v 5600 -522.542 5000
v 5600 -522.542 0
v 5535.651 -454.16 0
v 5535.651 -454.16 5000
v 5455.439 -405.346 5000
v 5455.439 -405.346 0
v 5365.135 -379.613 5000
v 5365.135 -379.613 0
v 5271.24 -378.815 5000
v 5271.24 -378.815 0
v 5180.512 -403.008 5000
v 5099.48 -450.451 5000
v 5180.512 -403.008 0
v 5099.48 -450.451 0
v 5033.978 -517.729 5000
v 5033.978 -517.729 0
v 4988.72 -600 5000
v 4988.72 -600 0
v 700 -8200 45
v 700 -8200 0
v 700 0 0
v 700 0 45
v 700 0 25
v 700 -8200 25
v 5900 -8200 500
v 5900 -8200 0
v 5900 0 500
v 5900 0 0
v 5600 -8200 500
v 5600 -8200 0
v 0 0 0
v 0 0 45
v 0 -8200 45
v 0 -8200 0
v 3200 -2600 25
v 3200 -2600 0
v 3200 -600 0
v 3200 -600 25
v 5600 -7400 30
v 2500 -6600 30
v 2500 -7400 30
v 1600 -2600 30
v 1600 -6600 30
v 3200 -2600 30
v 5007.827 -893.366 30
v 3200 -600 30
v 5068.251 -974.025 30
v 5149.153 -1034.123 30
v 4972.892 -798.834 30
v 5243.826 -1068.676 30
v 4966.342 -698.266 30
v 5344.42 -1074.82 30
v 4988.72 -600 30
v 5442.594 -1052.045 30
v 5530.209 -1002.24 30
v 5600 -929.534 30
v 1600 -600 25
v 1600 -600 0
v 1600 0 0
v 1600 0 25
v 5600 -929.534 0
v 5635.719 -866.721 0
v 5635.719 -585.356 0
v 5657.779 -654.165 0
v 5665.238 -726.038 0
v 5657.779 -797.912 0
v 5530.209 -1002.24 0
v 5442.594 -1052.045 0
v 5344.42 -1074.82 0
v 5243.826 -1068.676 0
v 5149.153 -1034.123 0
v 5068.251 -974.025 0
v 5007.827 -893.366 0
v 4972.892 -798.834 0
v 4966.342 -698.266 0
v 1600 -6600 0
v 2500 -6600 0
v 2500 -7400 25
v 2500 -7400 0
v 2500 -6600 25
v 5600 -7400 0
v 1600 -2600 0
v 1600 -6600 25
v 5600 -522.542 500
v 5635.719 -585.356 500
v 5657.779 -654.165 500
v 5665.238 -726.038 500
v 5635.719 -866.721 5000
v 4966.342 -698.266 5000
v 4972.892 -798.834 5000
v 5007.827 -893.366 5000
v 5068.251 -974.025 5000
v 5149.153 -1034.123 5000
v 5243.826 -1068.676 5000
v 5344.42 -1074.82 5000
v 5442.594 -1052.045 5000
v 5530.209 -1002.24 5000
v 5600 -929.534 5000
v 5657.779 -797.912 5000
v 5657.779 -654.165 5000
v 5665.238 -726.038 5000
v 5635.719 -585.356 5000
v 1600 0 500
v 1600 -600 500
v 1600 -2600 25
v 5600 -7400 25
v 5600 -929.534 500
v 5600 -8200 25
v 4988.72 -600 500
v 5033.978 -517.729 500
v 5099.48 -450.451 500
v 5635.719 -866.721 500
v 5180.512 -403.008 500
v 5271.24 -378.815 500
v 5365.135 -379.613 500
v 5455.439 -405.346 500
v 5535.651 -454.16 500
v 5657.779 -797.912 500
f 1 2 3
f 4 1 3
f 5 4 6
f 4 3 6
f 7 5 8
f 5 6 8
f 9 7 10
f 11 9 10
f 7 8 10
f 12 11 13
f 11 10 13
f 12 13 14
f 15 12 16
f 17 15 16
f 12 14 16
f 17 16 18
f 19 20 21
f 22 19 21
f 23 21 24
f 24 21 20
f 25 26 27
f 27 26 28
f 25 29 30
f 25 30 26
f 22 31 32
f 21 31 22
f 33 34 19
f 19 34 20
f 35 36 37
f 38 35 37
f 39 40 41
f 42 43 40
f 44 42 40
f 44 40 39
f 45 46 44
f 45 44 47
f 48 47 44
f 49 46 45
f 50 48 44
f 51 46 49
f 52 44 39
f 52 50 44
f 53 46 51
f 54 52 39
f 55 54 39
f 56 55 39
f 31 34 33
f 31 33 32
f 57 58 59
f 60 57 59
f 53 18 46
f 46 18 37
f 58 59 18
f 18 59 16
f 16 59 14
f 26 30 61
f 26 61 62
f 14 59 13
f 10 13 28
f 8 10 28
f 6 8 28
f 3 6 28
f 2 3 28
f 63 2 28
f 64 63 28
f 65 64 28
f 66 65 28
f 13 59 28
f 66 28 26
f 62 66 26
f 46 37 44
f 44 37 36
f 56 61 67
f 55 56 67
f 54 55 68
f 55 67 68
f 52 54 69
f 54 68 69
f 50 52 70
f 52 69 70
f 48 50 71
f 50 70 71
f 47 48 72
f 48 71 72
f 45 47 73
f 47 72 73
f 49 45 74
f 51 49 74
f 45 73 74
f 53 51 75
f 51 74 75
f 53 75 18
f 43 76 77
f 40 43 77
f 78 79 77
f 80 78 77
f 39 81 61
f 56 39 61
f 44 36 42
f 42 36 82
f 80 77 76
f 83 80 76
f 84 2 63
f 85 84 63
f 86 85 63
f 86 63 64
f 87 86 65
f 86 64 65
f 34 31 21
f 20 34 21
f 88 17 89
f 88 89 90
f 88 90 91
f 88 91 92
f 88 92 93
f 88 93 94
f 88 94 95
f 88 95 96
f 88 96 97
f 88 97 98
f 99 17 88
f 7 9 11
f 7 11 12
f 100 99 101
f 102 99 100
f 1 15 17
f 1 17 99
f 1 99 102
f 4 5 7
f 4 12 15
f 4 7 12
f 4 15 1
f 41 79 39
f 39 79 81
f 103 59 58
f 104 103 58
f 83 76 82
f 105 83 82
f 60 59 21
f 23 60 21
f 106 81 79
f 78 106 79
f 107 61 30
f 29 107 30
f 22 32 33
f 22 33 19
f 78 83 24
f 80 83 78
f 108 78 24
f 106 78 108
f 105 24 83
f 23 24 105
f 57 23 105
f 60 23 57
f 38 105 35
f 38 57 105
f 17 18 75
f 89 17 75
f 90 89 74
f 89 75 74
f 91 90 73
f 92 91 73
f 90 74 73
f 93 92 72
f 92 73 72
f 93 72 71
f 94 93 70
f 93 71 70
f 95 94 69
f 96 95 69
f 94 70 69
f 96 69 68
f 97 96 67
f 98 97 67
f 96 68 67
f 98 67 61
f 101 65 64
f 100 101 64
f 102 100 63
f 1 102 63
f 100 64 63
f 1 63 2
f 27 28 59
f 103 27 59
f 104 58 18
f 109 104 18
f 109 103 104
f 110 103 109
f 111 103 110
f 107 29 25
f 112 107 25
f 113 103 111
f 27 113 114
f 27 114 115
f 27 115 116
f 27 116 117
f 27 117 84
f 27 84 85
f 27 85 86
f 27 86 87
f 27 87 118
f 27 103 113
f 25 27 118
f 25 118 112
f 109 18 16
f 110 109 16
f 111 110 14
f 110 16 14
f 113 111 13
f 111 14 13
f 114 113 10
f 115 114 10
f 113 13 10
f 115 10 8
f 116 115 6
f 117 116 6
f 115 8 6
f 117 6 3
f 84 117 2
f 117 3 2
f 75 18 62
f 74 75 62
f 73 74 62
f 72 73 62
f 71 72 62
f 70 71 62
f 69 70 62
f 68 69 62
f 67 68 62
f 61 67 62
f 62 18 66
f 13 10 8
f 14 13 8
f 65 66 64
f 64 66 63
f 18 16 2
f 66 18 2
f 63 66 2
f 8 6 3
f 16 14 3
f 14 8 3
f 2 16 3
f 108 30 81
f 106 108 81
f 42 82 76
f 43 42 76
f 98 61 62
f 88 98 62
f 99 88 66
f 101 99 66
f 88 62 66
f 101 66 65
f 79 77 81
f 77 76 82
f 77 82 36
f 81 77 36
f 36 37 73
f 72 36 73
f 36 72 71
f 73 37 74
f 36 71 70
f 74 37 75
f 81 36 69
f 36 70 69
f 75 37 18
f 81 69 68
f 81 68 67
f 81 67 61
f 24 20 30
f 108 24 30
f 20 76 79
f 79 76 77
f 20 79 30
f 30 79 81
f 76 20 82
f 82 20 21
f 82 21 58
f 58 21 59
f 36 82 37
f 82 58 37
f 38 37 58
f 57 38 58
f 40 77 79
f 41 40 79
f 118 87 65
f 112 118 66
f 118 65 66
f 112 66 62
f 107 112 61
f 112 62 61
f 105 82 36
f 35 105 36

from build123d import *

# Parameters (mm, degrees)
F1_DEPTH = 500
F2_DEPTH = 25
F0_W     = 700
F0_H     = 8200
F3_DEPTH = 45
F4_DEPTH = 30
F5_DEPTH = 5000


with BuildPart() as f1:
    # F0 (on Top) → F1 (new body)
    with BuildSketch(Plane.XY):
        with BuildLine():
            Line((5600, 0), (1600, 0))
            Line((1600, 0), (1600, -600))
            Line((1600, -600), (3200, -600))
            Line((3200, -600), (4988.719512, -600))
            ThreePointArc((4988.719512, -600), (5271.240052, -378.814865), (5600, -522.542444))
            Line((5600, -522.542444), (5600, 0))
        make_face()
        with BuildLine():
            Line((5900, 0), (5600, 0))
            Line((5600, 0), (5600, -522.542444))
            ThreePointArc((5600, -522.542444), (5648.529688, -619.189672), (5665.237999, -726.038396))
            ThreePointArc((5665.237999, -726.038396), (5648.529688, -832.88712), (5600, -929.534349))
            Line((5600, -929.534349), (5600, -7400))
            Line((5600, -7400), (5600, -8200))
            Line((5600, -8200), (5900, -8200))
            Line((5900, -8200), (5900, 0))
        make_face()
    extrude(amount=F1_DEPTH)


with BuildPart() as f2:
    # F0 (on Top) → F2 (new body)
    with BuildSketch(Plane.XY):
        Polygon((1600, 0), (700, 0), (700, -8200), (5600, -8200), (5600, -7400), (2500, -7400), (2500, -6600), (1600, -6600), (1600, -2600), (3200, -2600), (3200, -600), (1600, -600), align=None)
    extrude(amount=F2_DEPTH)


with BuildPart() as f3:
    # F0 (on Top) → F3 (new body)
    with BuildSketch(Plane.XY):
        with Locations((350, -4100)):
            Rectangle(F0_W, F0_H)
    extrude(amount=F3_DEPTH)


with BuildPart() as f4:
    # F0 (on Top) → F4 (new body)
    with BuildSketch(Plane.XY):
        with BuildLine():
            Line((4988.719512, -600), (3200, -600))
            Line((3200, -600), (3200, -2600))
            Line((3200, -2600), (1600, -2600))
            Line((1600, -2600), (1600, -6600))
            Line((1600, -6600), (2500, -6600))
            Line((2500, -6600), (2500, -7400))
            Line((2500, -7400), (5600, -7400))
            Line((5600, -7400), (5600, -929.534349))
            ThreePointArc((5600, -929.534349), (5149.153313, -1034.122601), (4988.719512, -600))
        make_face()
    extrude(amount=F4_DEPTH)


with BuildPart() as f5:
    # F0 (on Top) → F5 (new body)
    with BuildSketch(Plane.XY):
        with BuildLine():
            Line((5600, -929.534349), (5600, -600))
            Line((5600, -600), (4988.719512, -600))
            ThreePointArc((4988.719512, -600), (5149.153313, -1034.122601), (5600, -929.534349))
        make_face()
        with BuildLine():
            ThreePointArc((5665.237999, -726.038396), (5648.529688, -619.189672), (5600, -522.542444))
            Line((5600, -522.542444), (5600, -600))
            Line((5600, -600), (5600, -929.534349))
            ThreePointArc((5600, -929.534349), (5648.529688, -832.88712), (5665.237999, -726.038396))
        make_face()
        with BuildLine():
            Line((5600, -600), (5600, -522.542444))
            ThreePointArc((5600, -522.542444), (5271.240052, -378.814865), (4988.719512, -600))
            Line((4988.719512, -600), (5600, -600))
        make_face()
    extrude(amount=F5_DEPTH)


solid = Compound([f1.part, f2.part, f3.part, f4.part, f5.part])
